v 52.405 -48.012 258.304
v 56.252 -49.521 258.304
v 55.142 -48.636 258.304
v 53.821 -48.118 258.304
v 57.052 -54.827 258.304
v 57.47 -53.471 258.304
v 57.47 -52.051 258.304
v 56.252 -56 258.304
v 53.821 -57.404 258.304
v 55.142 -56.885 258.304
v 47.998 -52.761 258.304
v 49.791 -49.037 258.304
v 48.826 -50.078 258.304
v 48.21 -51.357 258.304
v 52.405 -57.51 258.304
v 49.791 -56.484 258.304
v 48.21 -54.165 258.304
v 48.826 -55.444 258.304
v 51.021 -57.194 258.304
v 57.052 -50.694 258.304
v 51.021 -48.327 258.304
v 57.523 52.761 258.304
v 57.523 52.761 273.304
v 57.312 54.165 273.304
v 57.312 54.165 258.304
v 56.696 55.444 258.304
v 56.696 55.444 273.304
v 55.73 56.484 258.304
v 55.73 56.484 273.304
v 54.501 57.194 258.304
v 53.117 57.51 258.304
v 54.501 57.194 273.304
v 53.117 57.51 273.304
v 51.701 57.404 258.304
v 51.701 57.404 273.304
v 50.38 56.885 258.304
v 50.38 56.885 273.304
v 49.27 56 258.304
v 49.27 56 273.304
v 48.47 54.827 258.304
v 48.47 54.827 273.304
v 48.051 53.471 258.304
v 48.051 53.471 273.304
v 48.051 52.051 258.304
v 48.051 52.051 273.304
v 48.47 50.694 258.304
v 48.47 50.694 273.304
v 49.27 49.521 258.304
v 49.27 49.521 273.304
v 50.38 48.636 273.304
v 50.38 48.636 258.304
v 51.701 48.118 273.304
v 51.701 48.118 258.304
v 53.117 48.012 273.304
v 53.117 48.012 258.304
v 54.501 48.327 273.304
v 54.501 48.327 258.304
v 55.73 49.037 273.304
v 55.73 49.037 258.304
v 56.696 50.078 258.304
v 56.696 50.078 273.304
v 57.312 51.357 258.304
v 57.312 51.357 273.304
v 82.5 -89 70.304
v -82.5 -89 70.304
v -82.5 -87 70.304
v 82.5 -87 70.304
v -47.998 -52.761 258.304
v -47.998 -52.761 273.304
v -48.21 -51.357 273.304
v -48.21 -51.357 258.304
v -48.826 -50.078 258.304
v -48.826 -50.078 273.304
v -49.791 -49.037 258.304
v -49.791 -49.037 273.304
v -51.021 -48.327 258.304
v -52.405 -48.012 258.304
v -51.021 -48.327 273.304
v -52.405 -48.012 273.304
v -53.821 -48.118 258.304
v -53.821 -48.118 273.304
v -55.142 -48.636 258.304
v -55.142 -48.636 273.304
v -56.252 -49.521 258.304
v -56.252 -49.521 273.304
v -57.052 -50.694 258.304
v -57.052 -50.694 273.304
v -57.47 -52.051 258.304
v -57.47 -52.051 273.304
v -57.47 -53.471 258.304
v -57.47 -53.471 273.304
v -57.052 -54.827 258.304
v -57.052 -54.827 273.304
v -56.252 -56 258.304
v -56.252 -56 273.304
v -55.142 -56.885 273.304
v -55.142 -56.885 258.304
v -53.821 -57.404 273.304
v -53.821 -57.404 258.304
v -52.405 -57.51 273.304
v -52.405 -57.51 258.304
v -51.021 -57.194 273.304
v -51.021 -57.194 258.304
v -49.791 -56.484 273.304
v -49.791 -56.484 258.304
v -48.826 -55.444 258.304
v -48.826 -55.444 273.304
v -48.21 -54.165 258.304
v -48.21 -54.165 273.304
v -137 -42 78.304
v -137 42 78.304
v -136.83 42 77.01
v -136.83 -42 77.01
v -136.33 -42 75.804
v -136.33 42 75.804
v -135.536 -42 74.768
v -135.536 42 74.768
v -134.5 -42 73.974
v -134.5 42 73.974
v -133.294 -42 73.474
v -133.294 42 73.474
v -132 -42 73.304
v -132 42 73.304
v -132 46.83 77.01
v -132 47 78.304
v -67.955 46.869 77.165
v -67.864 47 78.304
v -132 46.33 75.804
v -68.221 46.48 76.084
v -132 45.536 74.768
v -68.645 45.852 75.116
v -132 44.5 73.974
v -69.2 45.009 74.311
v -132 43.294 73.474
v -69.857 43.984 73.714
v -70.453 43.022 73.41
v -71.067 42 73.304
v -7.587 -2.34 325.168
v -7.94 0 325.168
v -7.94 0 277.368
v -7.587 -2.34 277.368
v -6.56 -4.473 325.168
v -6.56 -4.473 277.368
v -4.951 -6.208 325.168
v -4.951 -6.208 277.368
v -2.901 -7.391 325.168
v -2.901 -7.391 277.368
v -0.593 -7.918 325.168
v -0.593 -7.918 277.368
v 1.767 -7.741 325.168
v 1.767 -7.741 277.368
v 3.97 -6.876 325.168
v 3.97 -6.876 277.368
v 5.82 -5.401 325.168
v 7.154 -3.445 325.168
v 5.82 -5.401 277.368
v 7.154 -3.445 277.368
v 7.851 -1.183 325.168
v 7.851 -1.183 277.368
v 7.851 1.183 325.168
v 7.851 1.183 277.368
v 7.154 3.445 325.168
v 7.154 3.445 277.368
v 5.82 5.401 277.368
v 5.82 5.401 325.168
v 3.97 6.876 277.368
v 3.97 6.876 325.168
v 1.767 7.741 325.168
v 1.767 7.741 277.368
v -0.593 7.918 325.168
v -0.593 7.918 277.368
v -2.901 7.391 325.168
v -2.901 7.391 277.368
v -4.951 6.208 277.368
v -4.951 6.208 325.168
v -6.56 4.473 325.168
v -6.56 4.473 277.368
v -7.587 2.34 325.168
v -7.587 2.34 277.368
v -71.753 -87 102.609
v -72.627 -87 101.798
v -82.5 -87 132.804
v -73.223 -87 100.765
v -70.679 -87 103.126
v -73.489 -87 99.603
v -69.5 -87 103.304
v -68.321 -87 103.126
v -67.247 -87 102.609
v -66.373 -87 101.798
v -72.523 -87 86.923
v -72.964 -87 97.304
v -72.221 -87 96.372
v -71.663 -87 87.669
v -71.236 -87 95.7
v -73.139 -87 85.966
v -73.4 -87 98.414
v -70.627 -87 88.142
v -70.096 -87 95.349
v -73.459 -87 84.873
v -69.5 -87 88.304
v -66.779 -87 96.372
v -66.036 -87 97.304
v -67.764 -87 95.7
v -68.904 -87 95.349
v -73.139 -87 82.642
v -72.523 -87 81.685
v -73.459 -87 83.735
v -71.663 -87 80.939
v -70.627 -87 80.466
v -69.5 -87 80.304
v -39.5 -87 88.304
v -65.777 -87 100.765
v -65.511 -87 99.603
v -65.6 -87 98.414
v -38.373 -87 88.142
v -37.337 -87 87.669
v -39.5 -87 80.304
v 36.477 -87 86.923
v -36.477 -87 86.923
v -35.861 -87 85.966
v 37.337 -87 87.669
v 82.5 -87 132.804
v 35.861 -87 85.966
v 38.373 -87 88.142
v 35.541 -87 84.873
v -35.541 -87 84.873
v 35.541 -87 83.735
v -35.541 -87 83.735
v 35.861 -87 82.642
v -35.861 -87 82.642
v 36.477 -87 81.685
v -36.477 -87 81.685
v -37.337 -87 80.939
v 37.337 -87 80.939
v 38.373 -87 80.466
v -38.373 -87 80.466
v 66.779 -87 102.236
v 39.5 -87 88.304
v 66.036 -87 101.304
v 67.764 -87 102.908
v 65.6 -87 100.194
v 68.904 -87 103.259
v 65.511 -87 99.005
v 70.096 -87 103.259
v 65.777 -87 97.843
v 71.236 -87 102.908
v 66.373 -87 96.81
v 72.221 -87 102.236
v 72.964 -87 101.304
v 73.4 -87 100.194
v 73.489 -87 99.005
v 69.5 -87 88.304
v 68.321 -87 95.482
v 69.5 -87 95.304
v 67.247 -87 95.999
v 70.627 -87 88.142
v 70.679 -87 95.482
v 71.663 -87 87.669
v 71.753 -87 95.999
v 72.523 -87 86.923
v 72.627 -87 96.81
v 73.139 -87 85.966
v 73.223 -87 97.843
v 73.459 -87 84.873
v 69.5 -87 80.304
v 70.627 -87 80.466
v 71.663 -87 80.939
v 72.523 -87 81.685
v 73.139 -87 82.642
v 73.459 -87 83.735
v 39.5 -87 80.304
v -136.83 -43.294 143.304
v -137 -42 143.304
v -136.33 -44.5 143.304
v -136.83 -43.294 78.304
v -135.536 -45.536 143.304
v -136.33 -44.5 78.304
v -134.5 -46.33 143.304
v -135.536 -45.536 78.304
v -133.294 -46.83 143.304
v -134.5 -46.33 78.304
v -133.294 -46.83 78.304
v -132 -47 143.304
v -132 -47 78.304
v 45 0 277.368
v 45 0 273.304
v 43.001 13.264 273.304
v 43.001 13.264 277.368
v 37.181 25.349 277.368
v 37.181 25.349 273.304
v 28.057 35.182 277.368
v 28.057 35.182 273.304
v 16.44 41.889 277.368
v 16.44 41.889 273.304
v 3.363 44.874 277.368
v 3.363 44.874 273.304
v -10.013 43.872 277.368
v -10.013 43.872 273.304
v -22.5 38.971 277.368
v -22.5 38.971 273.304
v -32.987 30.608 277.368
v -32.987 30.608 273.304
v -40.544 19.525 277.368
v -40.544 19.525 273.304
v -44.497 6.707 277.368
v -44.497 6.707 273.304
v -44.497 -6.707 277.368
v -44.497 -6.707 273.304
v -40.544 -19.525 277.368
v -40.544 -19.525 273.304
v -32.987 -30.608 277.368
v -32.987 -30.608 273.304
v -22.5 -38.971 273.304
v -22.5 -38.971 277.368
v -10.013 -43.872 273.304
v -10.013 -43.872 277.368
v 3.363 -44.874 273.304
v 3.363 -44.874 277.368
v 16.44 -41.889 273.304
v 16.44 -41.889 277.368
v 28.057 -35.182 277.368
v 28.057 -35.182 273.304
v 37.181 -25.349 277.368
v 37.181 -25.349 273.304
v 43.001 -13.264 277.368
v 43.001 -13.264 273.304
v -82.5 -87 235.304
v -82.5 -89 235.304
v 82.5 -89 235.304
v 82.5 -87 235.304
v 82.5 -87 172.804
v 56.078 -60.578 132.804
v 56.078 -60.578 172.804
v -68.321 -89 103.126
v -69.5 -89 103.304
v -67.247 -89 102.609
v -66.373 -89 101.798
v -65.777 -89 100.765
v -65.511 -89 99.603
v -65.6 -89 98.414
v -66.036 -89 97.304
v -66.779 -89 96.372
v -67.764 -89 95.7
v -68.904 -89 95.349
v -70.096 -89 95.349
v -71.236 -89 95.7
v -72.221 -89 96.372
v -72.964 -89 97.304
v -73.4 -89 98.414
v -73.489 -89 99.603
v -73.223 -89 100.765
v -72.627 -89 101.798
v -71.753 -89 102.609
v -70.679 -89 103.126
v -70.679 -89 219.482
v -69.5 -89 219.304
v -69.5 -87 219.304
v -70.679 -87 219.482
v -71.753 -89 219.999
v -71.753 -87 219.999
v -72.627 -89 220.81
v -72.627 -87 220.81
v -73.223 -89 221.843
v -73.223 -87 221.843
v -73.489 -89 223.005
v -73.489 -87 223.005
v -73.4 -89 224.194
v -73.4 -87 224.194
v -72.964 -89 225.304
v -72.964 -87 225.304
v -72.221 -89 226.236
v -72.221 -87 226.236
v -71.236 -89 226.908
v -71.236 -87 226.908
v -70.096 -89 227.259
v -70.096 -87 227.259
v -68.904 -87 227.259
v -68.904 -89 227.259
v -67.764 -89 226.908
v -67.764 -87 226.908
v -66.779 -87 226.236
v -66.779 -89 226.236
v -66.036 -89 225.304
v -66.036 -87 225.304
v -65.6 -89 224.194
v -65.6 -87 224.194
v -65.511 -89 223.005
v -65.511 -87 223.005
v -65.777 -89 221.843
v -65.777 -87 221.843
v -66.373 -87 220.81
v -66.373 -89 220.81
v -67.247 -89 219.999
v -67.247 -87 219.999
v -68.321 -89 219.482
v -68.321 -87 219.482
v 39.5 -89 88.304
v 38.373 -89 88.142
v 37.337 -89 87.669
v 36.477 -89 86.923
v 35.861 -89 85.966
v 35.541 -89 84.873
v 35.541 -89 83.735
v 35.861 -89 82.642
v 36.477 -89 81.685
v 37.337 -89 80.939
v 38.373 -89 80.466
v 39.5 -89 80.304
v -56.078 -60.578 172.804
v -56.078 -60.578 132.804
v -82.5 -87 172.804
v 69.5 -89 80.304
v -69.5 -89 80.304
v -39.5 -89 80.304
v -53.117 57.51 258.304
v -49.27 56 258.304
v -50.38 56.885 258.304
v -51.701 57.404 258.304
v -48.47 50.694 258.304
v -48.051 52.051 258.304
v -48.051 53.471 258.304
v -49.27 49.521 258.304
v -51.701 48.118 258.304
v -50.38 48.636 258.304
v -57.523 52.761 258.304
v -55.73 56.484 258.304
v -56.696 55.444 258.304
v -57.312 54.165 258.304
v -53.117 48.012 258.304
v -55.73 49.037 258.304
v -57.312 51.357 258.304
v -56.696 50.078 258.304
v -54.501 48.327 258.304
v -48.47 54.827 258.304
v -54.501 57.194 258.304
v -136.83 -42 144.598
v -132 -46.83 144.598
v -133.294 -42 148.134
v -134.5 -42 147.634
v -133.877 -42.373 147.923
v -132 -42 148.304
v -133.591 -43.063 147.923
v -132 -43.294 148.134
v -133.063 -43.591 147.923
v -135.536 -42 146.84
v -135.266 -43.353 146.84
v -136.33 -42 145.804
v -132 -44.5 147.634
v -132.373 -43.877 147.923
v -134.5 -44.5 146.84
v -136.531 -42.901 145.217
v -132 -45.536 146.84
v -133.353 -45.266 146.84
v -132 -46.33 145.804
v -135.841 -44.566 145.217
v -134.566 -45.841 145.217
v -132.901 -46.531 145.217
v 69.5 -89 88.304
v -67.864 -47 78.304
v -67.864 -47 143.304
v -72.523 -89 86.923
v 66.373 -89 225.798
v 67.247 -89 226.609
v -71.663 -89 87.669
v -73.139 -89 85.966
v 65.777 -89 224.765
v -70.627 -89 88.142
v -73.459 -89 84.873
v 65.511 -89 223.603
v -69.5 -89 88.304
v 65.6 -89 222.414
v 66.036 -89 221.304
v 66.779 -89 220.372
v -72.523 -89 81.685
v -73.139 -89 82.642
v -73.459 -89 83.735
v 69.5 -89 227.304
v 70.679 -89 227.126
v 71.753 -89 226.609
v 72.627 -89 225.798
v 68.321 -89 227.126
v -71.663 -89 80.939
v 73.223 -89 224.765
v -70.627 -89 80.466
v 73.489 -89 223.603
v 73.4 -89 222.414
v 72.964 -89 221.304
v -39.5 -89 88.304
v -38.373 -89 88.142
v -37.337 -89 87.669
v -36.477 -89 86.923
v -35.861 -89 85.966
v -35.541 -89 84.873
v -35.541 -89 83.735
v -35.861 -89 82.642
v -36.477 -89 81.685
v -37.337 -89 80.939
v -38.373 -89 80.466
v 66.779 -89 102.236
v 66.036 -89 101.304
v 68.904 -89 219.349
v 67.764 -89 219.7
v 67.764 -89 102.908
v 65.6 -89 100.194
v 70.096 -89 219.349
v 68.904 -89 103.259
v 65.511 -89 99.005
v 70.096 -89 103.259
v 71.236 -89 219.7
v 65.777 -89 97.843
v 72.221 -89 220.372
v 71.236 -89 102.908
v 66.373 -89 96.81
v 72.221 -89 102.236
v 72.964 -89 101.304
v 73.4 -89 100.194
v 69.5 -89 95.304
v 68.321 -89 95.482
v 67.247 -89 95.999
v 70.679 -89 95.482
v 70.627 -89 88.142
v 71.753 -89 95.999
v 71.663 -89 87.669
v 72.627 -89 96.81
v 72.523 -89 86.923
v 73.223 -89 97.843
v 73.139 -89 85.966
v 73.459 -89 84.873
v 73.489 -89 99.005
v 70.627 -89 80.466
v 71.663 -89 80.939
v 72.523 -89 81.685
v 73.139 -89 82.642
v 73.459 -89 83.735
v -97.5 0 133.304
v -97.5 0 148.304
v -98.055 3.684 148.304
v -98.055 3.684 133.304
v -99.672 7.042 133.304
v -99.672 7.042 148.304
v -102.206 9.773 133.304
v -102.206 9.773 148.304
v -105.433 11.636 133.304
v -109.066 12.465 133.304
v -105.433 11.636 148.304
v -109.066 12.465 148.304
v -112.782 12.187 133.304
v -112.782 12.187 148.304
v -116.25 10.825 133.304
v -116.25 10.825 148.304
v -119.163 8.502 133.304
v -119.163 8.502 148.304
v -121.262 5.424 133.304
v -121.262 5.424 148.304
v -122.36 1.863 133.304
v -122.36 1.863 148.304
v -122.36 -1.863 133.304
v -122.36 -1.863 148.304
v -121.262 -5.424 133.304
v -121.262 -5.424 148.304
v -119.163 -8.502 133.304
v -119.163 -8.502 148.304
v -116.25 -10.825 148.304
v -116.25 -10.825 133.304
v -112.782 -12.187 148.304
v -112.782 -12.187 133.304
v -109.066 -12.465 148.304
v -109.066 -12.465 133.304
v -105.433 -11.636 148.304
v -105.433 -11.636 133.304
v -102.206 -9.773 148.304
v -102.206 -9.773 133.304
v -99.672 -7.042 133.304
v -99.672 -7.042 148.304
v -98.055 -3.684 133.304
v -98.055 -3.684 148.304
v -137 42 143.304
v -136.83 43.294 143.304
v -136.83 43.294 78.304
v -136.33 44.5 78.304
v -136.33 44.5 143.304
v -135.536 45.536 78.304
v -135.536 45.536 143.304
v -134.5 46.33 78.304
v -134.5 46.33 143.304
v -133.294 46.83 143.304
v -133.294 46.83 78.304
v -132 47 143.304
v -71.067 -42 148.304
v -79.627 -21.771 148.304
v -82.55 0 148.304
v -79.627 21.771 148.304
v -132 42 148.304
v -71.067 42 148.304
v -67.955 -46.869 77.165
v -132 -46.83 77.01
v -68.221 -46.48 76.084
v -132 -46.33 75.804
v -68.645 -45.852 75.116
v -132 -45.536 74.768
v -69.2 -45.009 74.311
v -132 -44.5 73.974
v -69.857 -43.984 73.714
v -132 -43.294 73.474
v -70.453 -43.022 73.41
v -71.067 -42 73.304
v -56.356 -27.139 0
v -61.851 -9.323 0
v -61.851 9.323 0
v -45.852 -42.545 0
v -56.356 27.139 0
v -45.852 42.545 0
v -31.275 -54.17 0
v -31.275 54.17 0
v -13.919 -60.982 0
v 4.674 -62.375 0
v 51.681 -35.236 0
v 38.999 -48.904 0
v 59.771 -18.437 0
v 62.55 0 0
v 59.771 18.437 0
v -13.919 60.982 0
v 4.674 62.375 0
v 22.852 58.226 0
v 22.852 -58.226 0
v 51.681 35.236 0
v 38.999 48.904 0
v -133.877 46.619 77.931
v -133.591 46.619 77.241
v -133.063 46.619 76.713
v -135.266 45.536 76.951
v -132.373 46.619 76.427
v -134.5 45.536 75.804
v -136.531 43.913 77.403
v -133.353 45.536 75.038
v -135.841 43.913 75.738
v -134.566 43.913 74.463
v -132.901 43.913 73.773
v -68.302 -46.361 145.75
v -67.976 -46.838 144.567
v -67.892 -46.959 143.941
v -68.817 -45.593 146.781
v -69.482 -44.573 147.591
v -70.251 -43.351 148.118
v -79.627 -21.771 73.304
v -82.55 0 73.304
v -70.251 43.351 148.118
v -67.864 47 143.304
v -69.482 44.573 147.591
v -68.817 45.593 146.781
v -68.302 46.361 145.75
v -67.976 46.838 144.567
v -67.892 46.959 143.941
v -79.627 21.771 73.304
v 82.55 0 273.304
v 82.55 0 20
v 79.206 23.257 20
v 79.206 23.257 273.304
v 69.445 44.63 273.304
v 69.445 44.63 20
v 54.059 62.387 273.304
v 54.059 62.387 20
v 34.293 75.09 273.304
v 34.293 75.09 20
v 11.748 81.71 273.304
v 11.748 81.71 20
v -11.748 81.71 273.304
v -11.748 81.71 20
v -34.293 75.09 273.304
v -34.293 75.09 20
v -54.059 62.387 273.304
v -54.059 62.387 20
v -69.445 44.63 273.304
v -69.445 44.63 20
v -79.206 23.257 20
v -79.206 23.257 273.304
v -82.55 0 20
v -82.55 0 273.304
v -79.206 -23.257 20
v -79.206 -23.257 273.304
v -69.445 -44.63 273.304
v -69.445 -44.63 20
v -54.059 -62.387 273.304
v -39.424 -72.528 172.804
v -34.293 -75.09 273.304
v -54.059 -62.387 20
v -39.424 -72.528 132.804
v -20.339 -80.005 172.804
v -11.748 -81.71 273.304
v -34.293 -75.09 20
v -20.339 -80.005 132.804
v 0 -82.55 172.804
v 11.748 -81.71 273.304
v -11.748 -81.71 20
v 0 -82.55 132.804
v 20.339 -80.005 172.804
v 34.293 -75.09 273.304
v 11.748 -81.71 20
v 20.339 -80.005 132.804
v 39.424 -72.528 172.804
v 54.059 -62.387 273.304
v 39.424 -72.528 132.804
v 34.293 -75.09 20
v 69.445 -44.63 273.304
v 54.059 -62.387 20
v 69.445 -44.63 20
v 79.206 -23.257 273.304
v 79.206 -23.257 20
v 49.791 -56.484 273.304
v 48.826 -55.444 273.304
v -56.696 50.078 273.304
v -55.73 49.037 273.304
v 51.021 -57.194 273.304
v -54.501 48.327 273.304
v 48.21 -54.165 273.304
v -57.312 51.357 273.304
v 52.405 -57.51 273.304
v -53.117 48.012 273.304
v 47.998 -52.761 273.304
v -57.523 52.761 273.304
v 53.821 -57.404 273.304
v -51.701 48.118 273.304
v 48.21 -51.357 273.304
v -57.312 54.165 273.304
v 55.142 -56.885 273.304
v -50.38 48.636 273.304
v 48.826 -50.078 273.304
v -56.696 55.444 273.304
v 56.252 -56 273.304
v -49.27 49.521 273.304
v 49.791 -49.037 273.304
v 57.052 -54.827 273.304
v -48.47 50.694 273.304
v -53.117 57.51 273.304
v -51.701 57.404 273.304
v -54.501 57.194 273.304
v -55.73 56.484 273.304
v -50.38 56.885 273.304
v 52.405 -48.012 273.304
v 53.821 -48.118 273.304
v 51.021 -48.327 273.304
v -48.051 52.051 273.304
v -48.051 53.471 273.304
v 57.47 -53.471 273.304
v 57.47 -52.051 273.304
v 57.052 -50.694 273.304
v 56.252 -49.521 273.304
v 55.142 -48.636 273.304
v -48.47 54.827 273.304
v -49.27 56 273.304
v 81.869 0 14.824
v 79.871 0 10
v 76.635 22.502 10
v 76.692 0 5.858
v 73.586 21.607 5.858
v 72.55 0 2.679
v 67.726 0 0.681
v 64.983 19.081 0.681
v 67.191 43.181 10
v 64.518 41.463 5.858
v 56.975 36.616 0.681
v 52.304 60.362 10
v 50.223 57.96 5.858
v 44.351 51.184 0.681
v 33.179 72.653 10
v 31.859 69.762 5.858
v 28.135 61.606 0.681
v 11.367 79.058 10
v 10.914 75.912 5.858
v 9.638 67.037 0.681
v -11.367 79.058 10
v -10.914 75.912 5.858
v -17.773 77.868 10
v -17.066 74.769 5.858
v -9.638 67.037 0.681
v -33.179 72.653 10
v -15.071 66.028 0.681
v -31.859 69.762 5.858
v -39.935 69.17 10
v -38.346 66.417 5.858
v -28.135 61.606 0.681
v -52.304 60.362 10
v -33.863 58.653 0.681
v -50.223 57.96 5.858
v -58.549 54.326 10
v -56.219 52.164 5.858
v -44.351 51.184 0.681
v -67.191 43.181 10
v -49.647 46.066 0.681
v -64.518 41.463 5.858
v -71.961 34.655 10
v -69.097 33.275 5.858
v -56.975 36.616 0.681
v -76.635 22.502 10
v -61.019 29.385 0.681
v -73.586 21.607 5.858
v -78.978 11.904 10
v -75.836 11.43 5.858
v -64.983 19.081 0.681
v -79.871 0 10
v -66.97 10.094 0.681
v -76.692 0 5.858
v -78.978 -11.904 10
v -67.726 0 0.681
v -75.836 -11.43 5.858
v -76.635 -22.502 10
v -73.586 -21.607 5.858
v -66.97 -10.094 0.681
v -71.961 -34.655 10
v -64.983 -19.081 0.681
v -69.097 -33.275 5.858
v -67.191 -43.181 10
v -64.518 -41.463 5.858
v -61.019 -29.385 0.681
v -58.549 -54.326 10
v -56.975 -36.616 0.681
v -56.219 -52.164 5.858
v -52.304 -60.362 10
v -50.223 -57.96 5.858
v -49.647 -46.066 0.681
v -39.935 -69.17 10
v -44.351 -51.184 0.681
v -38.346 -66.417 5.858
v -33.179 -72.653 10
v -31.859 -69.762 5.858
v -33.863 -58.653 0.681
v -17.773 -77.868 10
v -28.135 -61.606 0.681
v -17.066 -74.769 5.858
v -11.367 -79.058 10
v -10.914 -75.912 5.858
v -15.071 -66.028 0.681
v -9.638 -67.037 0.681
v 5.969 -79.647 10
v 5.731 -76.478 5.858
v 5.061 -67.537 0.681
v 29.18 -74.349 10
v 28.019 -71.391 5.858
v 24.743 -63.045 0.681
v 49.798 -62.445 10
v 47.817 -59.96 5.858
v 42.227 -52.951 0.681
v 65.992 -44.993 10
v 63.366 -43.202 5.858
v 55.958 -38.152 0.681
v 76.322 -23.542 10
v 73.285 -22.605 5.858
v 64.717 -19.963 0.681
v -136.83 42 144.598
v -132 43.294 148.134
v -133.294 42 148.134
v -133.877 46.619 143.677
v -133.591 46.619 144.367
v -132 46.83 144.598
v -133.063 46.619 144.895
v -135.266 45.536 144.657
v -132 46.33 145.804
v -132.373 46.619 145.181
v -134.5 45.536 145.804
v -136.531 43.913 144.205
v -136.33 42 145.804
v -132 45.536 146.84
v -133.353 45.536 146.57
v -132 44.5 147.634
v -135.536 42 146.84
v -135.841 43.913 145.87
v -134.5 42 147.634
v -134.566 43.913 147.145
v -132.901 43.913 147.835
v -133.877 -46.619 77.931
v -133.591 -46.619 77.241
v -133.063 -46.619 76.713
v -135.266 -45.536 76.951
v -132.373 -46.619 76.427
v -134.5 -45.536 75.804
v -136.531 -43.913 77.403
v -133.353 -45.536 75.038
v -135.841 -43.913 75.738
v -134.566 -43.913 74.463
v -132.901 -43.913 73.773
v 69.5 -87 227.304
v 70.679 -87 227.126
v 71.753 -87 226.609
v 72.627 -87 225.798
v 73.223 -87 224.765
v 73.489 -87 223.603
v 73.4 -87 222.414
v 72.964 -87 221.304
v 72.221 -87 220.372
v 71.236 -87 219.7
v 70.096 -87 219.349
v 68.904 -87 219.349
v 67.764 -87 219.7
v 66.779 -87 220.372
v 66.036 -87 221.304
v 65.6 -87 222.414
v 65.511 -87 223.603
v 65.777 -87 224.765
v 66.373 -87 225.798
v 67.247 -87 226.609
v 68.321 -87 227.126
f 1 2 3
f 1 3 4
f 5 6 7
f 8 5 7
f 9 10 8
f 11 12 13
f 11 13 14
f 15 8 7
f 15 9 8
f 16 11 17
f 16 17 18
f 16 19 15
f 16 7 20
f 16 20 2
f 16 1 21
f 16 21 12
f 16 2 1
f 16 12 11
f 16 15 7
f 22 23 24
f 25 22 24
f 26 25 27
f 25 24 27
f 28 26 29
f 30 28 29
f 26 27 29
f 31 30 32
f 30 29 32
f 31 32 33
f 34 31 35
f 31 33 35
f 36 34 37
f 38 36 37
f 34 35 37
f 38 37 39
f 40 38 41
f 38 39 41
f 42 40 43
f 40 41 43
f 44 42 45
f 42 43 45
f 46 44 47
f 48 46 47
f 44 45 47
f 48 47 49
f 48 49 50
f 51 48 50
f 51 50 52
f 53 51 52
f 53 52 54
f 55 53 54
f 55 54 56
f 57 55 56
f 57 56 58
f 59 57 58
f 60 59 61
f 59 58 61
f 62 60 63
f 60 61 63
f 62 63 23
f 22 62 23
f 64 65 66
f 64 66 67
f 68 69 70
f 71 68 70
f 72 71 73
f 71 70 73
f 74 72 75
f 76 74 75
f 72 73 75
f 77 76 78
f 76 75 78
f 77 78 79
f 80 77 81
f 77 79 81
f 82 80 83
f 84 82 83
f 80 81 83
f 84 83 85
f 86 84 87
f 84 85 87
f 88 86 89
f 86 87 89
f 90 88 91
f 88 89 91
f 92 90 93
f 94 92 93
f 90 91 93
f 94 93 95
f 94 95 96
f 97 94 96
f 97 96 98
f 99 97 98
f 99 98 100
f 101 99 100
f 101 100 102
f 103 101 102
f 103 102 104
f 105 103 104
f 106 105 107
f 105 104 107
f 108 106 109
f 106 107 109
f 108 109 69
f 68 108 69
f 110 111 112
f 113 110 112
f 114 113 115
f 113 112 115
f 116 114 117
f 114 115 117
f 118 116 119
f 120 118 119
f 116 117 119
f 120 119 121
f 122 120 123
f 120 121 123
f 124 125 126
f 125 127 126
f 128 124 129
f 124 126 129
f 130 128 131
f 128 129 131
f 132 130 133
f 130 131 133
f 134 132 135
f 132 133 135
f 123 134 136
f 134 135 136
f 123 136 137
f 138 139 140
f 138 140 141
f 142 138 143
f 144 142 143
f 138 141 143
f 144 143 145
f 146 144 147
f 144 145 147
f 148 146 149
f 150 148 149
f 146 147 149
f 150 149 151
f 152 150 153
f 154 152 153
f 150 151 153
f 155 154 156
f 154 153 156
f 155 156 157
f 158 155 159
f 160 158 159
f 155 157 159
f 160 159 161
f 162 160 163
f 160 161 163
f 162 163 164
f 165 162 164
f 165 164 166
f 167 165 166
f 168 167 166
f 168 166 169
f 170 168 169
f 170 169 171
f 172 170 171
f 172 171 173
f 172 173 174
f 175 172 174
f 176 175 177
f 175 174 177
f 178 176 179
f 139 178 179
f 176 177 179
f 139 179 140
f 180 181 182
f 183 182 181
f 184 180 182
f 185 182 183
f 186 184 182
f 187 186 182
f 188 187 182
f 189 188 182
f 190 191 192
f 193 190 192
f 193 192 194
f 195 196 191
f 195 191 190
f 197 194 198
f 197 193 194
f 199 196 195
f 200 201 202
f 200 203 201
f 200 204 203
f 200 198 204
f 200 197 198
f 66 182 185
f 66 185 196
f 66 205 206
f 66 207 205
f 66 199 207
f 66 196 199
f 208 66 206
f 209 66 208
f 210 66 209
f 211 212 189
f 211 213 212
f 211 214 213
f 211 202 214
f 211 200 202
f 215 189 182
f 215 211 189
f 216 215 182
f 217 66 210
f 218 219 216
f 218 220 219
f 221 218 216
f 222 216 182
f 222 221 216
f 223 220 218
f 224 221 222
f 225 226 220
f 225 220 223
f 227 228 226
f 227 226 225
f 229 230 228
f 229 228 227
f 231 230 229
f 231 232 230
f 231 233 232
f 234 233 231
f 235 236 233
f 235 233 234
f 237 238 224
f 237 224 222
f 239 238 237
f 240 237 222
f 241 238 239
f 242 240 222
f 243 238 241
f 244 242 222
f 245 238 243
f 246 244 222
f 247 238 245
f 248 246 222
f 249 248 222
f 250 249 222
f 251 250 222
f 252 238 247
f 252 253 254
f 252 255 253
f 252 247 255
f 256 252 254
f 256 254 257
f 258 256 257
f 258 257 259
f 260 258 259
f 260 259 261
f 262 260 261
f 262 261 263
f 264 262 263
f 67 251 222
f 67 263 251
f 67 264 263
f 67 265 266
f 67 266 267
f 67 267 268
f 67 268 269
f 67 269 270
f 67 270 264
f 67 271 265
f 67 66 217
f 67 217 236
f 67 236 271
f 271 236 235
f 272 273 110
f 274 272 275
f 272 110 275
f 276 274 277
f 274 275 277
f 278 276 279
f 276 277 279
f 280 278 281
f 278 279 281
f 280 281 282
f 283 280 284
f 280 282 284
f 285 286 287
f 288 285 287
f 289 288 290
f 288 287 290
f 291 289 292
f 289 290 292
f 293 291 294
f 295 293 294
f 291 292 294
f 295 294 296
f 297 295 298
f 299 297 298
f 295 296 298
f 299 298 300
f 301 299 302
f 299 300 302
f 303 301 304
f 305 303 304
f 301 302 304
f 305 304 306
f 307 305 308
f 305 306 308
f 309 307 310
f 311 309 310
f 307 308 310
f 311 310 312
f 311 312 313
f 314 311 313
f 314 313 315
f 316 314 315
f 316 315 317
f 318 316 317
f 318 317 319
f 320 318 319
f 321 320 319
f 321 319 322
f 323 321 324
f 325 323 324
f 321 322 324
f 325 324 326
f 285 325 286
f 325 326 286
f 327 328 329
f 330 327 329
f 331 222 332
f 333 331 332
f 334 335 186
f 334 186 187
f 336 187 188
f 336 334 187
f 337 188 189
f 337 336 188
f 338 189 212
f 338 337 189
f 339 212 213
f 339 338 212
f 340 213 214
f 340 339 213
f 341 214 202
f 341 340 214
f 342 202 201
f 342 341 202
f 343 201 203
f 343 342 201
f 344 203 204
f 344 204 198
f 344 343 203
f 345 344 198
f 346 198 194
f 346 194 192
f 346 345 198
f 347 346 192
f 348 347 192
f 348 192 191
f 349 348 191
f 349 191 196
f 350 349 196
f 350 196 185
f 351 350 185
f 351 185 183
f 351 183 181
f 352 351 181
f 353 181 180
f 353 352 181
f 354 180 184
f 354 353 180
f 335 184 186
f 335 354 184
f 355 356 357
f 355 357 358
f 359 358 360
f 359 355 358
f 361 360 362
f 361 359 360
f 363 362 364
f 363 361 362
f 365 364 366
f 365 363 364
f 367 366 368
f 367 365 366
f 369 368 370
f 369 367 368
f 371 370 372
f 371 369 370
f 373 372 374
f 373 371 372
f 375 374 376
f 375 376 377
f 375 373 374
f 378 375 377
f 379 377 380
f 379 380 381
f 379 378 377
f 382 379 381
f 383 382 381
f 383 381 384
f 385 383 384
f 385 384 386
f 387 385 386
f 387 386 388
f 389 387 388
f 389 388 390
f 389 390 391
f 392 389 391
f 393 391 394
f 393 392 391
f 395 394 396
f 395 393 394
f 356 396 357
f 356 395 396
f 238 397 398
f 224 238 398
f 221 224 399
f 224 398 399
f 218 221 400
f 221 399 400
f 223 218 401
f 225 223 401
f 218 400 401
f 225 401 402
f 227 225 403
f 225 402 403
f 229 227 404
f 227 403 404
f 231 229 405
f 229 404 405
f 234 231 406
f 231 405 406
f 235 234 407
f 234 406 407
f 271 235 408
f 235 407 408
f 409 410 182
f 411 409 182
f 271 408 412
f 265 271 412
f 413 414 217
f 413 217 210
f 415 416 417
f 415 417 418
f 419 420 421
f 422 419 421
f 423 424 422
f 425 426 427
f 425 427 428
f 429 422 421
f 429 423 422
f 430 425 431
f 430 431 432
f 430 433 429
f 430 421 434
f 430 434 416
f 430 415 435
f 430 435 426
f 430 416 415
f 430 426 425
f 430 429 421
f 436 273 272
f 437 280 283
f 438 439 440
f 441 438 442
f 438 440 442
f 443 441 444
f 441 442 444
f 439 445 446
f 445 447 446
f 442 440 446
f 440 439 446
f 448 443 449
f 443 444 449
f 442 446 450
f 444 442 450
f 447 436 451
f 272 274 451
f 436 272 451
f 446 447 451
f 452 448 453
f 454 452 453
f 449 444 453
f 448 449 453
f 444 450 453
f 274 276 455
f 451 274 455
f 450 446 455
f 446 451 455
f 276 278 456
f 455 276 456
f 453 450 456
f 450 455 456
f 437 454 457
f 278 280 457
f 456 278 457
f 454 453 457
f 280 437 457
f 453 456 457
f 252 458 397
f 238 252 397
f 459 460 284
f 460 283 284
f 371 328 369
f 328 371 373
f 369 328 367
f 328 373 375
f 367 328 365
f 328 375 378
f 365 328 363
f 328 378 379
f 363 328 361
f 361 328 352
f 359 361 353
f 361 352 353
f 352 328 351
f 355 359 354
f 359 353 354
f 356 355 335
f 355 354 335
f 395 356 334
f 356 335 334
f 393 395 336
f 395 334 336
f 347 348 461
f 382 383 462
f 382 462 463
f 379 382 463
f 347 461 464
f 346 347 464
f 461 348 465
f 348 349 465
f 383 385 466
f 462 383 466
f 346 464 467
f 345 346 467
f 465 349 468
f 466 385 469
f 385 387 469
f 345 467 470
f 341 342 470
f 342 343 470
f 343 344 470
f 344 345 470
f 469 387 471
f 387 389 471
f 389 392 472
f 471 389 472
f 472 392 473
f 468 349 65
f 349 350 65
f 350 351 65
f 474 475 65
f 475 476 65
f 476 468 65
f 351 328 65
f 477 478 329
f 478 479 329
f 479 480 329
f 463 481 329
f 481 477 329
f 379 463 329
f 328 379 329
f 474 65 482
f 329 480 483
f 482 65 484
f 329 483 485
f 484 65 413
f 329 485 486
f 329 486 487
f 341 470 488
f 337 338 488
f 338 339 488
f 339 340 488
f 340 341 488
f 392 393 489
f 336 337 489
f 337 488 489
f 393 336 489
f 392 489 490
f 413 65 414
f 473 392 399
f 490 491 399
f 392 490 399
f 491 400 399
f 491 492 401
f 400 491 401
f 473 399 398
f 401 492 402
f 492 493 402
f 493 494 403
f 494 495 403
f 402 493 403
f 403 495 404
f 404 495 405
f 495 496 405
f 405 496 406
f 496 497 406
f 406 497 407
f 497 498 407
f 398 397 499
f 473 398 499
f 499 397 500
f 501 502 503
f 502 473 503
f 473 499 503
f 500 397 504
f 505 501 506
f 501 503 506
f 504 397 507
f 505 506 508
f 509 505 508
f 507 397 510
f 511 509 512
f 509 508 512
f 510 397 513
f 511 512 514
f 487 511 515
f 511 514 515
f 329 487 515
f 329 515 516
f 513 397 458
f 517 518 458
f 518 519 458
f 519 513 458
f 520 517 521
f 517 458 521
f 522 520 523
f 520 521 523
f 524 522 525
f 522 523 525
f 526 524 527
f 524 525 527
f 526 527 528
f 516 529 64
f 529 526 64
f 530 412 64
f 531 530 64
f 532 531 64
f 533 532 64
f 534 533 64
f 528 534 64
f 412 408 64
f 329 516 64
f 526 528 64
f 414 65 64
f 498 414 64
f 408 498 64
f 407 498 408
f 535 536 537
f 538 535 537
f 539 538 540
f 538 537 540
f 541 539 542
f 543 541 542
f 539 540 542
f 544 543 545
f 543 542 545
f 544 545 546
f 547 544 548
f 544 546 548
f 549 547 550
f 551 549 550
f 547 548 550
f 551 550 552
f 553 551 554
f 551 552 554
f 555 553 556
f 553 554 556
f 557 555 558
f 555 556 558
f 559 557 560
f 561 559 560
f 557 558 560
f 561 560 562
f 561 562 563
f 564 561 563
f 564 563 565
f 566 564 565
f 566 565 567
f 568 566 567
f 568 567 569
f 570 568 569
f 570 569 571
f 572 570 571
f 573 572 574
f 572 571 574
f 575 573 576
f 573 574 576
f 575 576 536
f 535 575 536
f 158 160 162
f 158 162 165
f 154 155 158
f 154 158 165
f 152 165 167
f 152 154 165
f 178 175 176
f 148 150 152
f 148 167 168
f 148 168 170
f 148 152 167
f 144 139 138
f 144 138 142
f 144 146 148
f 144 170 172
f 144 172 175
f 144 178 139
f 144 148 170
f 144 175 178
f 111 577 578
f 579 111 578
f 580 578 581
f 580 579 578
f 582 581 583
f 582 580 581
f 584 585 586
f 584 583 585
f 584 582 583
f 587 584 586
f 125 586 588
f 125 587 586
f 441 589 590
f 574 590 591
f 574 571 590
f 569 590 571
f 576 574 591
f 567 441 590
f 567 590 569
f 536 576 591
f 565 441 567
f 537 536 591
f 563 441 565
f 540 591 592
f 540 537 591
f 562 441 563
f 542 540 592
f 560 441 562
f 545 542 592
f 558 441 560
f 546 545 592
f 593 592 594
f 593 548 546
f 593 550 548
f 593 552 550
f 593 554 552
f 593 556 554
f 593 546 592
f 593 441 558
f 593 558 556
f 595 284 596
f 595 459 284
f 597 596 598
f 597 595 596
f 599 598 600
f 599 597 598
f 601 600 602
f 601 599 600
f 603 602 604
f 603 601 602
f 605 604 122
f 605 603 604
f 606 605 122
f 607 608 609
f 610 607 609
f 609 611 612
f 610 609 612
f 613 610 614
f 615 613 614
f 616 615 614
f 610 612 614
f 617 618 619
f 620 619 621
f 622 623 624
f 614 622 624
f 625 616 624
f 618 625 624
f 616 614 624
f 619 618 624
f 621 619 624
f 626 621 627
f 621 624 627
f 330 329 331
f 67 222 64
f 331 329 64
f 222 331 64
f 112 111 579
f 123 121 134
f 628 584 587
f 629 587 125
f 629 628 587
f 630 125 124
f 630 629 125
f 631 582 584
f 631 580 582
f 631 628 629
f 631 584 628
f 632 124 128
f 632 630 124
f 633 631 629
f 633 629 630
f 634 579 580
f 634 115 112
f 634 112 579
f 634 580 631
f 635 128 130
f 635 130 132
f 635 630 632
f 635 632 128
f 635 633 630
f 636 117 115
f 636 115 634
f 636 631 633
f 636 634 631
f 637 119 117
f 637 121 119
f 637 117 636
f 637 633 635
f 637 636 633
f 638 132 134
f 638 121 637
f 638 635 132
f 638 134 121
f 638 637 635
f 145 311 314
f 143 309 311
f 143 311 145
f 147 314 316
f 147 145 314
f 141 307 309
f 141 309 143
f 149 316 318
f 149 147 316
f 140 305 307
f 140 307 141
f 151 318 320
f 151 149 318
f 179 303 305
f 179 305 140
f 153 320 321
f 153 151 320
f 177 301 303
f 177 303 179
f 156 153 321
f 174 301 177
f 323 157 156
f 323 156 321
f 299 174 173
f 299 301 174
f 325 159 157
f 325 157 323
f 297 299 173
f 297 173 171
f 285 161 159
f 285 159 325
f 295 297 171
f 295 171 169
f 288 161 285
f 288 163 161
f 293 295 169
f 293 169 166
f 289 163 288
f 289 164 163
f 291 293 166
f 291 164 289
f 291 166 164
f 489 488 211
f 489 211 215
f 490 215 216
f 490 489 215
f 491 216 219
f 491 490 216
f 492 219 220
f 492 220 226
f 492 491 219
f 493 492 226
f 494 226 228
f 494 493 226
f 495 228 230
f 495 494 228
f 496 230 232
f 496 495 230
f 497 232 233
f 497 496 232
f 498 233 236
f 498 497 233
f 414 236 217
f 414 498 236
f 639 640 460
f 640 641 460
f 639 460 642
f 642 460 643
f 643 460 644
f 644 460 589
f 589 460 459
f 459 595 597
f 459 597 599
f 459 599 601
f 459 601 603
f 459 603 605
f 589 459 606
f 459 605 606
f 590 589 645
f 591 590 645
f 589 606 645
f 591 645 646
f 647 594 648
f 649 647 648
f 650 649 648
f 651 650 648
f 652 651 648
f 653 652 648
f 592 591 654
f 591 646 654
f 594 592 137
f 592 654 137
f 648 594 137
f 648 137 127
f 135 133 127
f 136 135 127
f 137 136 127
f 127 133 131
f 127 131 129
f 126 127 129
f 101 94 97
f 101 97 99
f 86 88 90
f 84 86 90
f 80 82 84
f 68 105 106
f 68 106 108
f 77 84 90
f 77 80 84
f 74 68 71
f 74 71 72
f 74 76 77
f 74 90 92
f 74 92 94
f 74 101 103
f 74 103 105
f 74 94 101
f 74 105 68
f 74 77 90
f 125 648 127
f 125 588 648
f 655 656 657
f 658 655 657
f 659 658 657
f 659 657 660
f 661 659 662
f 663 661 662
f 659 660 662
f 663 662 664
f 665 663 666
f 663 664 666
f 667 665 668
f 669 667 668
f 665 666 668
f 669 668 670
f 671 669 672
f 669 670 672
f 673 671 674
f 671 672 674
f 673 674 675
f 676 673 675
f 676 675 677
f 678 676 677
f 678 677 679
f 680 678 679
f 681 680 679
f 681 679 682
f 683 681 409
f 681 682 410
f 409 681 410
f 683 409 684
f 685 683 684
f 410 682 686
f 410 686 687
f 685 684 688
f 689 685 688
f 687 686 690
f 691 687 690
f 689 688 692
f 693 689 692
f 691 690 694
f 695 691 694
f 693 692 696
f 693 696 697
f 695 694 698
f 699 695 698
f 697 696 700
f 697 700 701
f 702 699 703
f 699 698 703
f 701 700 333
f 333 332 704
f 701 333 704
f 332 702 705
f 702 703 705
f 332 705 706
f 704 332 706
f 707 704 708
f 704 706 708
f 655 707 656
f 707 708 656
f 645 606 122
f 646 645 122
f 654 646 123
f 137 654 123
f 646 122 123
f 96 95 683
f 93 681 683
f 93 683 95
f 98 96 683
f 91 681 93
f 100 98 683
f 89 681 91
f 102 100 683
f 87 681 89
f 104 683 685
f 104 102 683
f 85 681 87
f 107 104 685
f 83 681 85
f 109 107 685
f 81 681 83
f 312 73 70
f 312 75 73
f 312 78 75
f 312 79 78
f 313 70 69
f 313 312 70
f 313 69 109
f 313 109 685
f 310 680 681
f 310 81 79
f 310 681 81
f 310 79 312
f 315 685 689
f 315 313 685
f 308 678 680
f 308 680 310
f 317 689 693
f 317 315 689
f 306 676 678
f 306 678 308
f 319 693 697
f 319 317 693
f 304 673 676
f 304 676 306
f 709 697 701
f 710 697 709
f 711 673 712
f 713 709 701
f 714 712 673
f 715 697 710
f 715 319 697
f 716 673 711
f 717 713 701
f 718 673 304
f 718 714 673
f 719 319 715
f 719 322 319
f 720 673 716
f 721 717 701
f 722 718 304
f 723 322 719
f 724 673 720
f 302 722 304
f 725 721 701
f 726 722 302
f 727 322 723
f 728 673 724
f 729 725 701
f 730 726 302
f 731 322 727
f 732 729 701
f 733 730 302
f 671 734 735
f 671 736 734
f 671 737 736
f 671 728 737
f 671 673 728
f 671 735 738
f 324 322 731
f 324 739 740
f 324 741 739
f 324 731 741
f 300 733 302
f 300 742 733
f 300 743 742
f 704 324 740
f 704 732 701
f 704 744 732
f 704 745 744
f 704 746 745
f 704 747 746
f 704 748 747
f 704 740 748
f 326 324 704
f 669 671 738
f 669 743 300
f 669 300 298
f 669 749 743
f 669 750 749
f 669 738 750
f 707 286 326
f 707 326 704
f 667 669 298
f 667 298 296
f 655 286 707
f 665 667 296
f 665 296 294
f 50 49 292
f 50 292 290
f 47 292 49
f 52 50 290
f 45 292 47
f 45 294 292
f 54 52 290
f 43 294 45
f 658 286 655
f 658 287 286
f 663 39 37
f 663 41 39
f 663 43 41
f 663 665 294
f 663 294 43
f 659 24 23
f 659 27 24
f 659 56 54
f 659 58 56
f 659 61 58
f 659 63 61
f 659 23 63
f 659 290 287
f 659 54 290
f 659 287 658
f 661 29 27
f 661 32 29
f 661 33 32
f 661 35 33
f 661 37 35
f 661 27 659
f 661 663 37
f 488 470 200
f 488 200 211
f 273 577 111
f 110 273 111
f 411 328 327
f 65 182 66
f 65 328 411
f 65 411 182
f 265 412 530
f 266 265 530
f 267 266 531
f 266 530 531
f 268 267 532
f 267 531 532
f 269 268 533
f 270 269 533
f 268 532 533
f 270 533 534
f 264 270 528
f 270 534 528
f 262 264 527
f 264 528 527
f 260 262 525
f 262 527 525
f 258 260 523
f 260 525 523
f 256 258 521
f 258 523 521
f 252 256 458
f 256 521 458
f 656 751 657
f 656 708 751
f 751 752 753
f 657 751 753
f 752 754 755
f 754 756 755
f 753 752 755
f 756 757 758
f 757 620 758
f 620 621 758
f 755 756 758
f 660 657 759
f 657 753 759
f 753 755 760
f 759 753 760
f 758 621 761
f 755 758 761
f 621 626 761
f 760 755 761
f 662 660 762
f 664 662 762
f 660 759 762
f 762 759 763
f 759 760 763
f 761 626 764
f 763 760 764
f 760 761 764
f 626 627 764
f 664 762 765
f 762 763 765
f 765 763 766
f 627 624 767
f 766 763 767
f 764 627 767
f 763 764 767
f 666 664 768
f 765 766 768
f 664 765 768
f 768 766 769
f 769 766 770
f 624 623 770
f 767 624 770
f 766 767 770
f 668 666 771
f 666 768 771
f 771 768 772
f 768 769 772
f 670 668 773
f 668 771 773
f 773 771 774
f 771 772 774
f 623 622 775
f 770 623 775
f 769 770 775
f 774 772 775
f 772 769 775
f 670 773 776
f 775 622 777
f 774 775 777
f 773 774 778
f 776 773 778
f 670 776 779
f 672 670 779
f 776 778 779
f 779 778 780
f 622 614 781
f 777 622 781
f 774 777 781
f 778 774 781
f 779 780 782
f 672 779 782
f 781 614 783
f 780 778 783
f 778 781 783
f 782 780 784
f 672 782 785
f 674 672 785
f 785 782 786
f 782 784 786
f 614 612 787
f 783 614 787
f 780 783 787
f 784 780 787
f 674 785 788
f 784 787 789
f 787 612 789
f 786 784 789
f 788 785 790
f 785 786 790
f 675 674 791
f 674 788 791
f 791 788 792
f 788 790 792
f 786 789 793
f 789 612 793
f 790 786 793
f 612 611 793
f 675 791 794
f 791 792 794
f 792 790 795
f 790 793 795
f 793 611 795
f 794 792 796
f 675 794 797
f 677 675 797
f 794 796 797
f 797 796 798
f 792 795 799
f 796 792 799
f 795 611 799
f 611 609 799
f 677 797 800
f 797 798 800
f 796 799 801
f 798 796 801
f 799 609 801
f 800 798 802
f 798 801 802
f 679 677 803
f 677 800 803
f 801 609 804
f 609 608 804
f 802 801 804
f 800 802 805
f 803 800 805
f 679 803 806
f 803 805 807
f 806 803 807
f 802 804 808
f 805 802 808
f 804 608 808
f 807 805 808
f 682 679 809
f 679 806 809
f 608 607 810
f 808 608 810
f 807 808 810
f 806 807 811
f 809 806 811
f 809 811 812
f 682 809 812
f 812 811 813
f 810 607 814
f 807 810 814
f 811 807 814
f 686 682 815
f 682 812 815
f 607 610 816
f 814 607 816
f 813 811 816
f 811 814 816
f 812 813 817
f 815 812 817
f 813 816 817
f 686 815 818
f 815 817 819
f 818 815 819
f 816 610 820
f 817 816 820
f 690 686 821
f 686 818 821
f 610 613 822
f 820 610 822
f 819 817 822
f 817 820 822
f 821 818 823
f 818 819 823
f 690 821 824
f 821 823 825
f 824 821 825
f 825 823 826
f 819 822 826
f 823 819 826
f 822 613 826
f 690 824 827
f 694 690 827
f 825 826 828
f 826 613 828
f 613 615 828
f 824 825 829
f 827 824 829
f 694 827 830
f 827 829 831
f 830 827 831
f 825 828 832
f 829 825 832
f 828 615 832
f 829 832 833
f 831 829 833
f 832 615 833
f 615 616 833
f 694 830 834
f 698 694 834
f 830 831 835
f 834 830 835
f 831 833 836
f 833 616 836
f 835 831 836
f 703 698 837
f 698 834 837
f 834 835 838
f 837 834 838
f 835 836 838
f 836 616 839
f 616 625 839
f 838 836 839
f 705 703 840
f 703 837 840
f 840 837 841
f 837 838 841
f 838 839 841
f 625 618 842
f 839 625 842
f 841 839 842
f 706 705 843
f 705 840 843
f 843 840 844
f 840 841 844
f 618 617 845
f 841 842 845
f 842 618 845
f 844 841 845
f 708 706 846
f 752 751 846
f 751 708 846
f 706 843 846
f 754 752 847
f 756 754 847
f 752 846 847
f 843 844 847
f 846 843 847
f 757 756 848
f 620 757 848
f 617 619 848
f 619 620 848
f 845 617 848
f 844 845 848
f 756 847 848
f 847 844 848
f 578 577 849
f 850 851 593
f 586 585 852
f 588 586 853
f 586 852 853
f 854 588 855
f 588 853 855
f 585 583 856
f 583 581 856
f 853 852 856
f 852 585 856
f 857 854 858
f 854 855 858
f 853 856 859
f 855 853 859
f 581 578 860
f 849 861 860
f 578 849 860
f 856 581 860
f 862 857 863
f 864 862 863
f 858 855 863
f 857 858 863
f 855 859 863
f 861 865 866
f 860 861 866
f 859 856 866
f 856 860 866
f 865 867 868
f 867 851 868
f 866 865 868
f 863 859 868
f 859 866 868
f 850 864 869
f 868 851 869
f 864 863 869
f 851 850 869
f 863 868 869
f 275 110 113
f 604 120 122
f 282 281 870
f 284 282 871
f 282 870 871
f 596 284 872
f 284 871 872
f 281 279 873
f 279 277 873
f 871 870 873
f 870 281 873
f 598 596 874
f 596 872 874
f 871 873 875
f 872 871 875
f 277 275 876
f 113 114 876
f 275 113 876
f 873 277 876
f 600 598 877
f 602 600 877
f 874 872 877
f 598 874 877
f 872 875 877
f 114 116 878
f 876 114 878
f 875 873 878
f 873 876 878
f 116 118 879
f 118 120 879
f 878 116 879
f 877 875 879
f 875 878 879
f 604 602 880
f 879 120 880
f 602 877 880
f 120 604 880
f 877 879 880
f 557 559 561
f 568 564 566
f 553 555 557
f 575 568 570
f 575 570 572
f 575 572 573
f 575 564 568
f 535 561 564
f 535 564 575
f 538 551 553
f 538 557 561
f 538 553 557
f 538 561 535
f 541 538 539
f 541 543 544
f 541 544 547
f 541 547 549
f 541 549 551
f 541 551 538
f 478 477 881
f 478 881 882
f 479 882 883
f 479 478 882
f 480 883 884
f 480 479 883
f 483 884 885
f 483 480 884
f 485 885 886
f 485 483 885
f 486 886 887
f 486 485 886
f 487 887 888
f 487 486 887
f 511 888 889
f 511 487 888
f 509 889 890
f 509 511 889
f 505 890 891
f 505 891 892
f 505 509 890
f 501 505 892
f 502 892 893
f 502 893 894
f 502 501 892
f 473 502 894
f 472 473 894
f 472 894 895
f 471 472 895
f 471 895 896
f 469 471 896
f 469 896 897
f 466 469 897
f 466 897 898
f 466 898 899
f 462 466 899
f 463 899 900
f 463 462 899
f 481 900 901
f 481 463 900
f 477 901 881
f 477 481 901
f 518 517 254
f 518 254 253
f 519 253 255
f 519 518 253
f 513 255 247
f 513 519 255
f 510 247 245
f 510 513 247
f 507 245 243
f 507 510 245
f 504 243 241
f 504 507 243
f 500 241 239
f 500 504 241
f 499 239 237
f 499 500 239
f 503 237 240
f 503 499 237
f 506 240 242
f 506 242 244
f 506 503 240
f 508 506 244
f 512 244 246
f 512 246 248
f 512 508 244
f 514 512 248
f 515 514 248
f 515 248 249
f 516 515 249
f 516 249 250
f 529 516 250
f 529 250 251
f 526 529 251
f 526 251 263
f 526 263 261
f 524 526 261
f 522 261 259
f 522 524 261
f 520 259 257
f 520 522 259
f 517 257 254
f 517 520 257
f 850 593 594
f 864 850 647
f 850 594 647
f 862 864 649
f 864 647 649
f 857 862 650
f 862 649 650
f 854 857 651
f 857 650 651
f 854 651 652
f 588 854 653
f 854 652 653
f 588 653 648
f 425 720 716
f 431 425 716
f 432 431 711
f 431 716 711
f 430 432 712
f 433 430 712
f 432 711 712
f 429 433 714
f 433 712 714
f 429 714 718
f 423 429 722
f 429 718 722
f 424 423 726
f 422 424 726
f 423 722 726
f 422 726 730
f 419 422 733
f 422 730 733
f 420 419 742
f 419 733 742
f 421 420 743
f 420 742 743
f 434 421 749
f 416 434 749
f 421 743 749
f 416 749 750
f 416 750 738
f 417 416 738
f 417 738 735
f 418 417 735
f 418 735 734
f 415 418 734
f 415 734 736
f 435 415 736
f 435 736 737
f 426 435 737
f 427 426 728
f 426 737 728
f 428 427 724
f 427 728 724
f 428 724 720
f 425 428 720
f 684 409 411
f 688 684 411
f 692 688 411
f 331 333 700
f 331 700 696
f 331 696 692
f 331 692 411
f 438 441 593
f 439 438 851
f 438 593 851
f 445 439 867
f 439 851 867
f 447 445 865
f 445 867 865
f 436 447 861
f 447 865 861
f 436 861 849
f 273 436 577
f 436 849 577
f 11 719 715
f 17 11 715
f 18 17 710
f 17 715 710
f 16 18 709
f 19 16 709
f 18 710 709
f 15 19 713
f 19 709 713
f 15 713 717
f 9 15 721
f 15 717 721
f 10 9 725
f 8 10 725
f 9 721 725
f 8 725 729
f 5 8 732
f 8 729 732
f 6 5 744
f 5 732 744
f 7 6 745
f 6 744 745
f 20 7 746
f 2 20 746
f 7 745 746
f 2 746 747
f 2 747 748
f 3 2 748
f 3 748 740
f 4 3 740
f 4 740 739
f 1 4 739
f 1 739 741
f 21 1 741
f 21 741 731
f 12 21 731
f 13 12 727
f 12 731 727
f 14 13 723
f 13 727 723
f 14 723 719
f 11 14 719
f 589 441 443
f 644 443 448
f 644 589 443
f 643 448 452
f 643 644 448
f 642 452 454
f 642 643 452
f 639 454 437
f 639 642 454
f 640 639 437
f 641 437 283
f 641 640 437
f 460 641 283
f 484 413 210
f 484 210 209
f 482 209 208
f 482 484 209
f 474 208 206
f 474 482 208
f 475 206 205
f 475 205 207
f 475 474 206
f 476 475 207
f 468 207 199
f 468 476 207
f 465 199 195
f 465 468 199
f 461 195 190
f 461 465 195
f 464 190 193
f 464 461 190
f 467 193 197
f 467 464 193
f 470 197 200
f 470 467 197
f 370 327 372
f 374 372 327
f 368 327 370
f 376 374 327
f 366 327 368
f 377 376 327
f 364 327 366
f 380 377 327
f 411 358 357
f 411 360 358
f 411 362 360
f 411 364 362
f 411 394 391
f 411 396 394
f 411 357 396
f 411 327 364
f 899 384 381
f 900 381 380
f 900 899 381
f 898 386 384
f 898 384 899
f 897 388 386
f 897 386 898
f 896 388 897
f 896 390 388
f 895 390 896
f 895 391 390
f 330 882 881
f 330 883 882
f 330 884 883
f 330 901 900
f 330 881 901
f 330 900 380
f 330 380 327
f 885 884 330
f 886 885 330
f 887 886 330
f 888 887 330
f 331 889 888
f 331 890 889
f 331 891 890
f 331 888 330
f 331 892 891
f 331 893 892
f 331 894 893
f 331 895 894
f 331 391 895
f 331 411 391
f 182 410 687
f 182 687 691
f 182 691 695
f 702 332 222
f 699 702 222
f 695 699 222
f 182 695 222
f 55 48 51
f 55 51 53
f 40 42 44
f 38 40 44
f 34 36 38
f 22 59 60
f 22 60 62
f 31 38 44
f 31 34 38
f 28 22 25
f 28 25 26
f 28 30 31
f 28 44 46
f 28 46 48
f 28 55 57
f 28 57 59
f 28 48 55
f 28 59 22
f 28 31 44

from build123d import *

# Parameters (mm, degrees)
SKETCH1_R                = 82.55
BOSS_EXTRUDE1_DEPTH      = 273.304
SKETCH2_R                = 45
BOSS_EXTRUDE2_DEPTH      = 4.064
SKETCH3_R                = 7.94
BOSS_EXTRUDE3_DEPTH      = 47.8
SKETCH5_W                = 165
SKETCH5_H                = 165
SKETCH5_R                = 4
BOSS_EXTRUDE4_DEPTH      = 2
BOSS_EXTRUDE5_REACH      = 404.315
BOSS_EXTRUDE5_END_RADIUS = 82.55
SKETCH6_W                = 75
SKETCH6_H                = 94
SKETCH7_R                = 4.7625
CUT_EXTRUDE1_DEPTH       = 15
SKETCH8_R                = 12.5
CUT_EXTRUDE2_DEPTH       = 15
BOSS_EXTRUDE6_DEPTH      = 20
BOSS_EXTRUDE6_DEPTH_BACK = 20
FILLET1_R                = 5
FILLET2_R                = 20


with BuildPart() as part:
    # Sketch1 → Boss-Extrude1 (new body)
    with BuildSketch(Plane.XY):
        Circle(SKETCH1_R)
    extrude(amount=BOSS_EXTRUDE1_DEPTH)

    # Sketch2 → Boss-Extrude2 (add)
    with BuildSketch(Plane.XY.offset(273.304)):
        Circle(SKETCH2_R)
    extrude(amount=BOSS_EXTRUDE2_DEPTH)

    # Sketch3 → Boss-Extrude3 (add)
    with BuildSketch(Plane.XY.offset(277.368)):
        with Locations(Location((0, 0, 0), (0, 0, 180))):
            Circle(SKETCH3_R)
    extrude(amount=BOSS_EXTRUDE3_DEPTH)

    # Sketch7 → Cut-Extrude1 (cut)
    with BuildSketch(Plane.XY.offset(273.304)):
        with Locations((52.760772478, 52.760772478)):
            Circle(SKETCH7_R)
        with Locations(Location((52.760772478, -52.760772478, 0), (0, 0, 180))):
            Circle(SKETCH7_R)
        with Locations((-52.760772478, -52.760772478)):
            Circle(SKETCH7_R)
        with Locations(Location((-52.760772478, 52.760772478, 0), (0, 0, 180))):
            Circle(SKETCH7_R)
    extrude(amount=-CUT_EXTRUDE1_DEPTH, mode=Mode.SUBTRACT)



with BuildPart() as body_2:
    # Sketch5 → Boss-Extrude4 (new body)
    with BuildSketch(Plane(origin=(0, -89, 0), x_dir=(1, 0, 0), z_dir=(0, 1, 0))):
        with Locations((0, -152.804)):
            Rectangle(SKETCH5_W, SKETCH5_H)
        with Locations(Location((69.5, -223.304, 0), (0, 0, 270))):
            Circle(SKETCH5_R, mode=Mode.SUBTRACT)
        with Locations(Location((69.5, -99.304, 0), (0, 0, 90))):
            Circle(SKETCH5_R, mode=Mode.SUBTRACT)
        with Locations(Location((-69.5, -99.304, 0), (0, 0, 270))):
            Circle(SKETCH5_R, mode=Mode.SUBTRACT)
        with Locations(Location((-69.5, -223.304, 0), (0, 0, 90))):
            Circle(SKETCH5_R, mode=Mode.SUBTRACT)
        with BuildLine():
            Line((69.5, -88.304), (39.5, -88.304))
            ThreePointArc((39.5, -88.304), (35.5, -84.304), (39.5, -80.304))
            Line((39.5, -80.304), (69.5, -80.304))
            ThreePointArc((69.5, -80.304), (73.5, -84.304), (69.5, -88.304))
        make_face(mode=Mode.SUBTRACT)
        with BuildLine():
            Line((-69.5, -88.304), (-39.5, -88.304))
            ThreePointArc((-39.5, -88.304), (-35.5, -84.304), (-39.5, -80.304))
            Line((-39.5, -80.304), (-69.5, -80.304))
            ThreePointArc((-69.5, -80.304), (-73.5, -84.304), (-69.5, -88.304))
        make_face(mode=Mode.SUBTRACT)
    extrude(amount=BOSS_EXTRUDE4_DEPTH)


with BuildPart() as body_3:
    # Boss-Extrude5: up to this cylinder (the profile starts outside it)
    boss_extrude5_end = Plane(origin=(0, 0, 110.804), z_dir=(0, 0, -1)) * Cylinder(BOSS_EXTRUDE5_END_RADIUS, 974.73, mode=Mode.PRIVATE)
    # Sketch6 → Boss-Extrude5 (new, up to the surface)
    with BuildSketch(Plane(origin=(-137, 0, 0), x_dir=(0, 0, -1), z_dir=(1, 0, 0)), mode=Mode.PRIVATE) as boss_extrude5_sk1:
        with Locations((-110.804, 0)):
            Rectangle(SKETCH6_W, SKETCH6_H)
    boss_extrude5_tool1 = extrude(boss_extrude5_sk1.sketch, amount=BOSS_EXTRUDE5_REACH, mode=Mode.PRIVATE) - boss_extrude5_end
    add(boss_extrude5_tool1.solids().sort_by_distance((-137, 0, 110.804))[0])

    # Sketch8 → Cut-Extrude2 (cut)
    with BuildSketch(Plane.XY.offset(148.304)):
        with Locations((-110, 0)):
            Circle(SKETCH8_R)
    extrude(amount=-CUT_EXTRUDE2_DEPTH, mode=Mode.SUBTRACT)

    # Fillet1
    fillet1_edges = [body_3.edges().sort_by_distance(p)[0] for p in [
        (-137, 0, 73.304),
        (-137, -47, 110.804),
        (-137, 0, 148.304),
        (-137, 47, 110.804),
        (-102.431926338, -47, 73.304),
        (-102.431926338, -47, 148.304),
        (-102.431926338, 47, 148.304),
        (-102.431926338, 47, 73.304),
    ]]
    fillet(fillet1_edges, radius=FILLET1_R)


with BuildPart() as part_1:
    add(part.part)

    add(body_2.part)  # Boss-Extrude6 merges body 2
    # Sketch9 → Boss-Extrude6 (add, two sides: drawn at the far end of the back side and taken through both)
    with BuildSketch(Plane.XY.offset(152.804).offset(-BOSS_EXTRUDE6_DEPTH_BACK)):
        with BuildLine():
            Line((-56.078284305, -60.578284305), (-82.5, -87))
            Line((-82.5, -87), (82.5, -87))
            Line((82.5, -87), (56.078284305, -60.578284305))
            ThreePointArc((56.078284305, -60.578284305), (0, -82.55), (-56.078284305, -60.578284305))
        make_face()
    extrude(amount=BOSS_EXTRUDE6_DEPTH + BOSS_EXTRUDE6_DEPTH_BACK)

    # Fillet2
    fillet2_edges = [part_1.edges().sort_by_distance(p)[0] for p in [
        (-82.55, 0, 0),
    ]]
    fillet(fillet2_edges, radius=FILLET2_R)


solid = Compound([body_3.part, part_1.part])
